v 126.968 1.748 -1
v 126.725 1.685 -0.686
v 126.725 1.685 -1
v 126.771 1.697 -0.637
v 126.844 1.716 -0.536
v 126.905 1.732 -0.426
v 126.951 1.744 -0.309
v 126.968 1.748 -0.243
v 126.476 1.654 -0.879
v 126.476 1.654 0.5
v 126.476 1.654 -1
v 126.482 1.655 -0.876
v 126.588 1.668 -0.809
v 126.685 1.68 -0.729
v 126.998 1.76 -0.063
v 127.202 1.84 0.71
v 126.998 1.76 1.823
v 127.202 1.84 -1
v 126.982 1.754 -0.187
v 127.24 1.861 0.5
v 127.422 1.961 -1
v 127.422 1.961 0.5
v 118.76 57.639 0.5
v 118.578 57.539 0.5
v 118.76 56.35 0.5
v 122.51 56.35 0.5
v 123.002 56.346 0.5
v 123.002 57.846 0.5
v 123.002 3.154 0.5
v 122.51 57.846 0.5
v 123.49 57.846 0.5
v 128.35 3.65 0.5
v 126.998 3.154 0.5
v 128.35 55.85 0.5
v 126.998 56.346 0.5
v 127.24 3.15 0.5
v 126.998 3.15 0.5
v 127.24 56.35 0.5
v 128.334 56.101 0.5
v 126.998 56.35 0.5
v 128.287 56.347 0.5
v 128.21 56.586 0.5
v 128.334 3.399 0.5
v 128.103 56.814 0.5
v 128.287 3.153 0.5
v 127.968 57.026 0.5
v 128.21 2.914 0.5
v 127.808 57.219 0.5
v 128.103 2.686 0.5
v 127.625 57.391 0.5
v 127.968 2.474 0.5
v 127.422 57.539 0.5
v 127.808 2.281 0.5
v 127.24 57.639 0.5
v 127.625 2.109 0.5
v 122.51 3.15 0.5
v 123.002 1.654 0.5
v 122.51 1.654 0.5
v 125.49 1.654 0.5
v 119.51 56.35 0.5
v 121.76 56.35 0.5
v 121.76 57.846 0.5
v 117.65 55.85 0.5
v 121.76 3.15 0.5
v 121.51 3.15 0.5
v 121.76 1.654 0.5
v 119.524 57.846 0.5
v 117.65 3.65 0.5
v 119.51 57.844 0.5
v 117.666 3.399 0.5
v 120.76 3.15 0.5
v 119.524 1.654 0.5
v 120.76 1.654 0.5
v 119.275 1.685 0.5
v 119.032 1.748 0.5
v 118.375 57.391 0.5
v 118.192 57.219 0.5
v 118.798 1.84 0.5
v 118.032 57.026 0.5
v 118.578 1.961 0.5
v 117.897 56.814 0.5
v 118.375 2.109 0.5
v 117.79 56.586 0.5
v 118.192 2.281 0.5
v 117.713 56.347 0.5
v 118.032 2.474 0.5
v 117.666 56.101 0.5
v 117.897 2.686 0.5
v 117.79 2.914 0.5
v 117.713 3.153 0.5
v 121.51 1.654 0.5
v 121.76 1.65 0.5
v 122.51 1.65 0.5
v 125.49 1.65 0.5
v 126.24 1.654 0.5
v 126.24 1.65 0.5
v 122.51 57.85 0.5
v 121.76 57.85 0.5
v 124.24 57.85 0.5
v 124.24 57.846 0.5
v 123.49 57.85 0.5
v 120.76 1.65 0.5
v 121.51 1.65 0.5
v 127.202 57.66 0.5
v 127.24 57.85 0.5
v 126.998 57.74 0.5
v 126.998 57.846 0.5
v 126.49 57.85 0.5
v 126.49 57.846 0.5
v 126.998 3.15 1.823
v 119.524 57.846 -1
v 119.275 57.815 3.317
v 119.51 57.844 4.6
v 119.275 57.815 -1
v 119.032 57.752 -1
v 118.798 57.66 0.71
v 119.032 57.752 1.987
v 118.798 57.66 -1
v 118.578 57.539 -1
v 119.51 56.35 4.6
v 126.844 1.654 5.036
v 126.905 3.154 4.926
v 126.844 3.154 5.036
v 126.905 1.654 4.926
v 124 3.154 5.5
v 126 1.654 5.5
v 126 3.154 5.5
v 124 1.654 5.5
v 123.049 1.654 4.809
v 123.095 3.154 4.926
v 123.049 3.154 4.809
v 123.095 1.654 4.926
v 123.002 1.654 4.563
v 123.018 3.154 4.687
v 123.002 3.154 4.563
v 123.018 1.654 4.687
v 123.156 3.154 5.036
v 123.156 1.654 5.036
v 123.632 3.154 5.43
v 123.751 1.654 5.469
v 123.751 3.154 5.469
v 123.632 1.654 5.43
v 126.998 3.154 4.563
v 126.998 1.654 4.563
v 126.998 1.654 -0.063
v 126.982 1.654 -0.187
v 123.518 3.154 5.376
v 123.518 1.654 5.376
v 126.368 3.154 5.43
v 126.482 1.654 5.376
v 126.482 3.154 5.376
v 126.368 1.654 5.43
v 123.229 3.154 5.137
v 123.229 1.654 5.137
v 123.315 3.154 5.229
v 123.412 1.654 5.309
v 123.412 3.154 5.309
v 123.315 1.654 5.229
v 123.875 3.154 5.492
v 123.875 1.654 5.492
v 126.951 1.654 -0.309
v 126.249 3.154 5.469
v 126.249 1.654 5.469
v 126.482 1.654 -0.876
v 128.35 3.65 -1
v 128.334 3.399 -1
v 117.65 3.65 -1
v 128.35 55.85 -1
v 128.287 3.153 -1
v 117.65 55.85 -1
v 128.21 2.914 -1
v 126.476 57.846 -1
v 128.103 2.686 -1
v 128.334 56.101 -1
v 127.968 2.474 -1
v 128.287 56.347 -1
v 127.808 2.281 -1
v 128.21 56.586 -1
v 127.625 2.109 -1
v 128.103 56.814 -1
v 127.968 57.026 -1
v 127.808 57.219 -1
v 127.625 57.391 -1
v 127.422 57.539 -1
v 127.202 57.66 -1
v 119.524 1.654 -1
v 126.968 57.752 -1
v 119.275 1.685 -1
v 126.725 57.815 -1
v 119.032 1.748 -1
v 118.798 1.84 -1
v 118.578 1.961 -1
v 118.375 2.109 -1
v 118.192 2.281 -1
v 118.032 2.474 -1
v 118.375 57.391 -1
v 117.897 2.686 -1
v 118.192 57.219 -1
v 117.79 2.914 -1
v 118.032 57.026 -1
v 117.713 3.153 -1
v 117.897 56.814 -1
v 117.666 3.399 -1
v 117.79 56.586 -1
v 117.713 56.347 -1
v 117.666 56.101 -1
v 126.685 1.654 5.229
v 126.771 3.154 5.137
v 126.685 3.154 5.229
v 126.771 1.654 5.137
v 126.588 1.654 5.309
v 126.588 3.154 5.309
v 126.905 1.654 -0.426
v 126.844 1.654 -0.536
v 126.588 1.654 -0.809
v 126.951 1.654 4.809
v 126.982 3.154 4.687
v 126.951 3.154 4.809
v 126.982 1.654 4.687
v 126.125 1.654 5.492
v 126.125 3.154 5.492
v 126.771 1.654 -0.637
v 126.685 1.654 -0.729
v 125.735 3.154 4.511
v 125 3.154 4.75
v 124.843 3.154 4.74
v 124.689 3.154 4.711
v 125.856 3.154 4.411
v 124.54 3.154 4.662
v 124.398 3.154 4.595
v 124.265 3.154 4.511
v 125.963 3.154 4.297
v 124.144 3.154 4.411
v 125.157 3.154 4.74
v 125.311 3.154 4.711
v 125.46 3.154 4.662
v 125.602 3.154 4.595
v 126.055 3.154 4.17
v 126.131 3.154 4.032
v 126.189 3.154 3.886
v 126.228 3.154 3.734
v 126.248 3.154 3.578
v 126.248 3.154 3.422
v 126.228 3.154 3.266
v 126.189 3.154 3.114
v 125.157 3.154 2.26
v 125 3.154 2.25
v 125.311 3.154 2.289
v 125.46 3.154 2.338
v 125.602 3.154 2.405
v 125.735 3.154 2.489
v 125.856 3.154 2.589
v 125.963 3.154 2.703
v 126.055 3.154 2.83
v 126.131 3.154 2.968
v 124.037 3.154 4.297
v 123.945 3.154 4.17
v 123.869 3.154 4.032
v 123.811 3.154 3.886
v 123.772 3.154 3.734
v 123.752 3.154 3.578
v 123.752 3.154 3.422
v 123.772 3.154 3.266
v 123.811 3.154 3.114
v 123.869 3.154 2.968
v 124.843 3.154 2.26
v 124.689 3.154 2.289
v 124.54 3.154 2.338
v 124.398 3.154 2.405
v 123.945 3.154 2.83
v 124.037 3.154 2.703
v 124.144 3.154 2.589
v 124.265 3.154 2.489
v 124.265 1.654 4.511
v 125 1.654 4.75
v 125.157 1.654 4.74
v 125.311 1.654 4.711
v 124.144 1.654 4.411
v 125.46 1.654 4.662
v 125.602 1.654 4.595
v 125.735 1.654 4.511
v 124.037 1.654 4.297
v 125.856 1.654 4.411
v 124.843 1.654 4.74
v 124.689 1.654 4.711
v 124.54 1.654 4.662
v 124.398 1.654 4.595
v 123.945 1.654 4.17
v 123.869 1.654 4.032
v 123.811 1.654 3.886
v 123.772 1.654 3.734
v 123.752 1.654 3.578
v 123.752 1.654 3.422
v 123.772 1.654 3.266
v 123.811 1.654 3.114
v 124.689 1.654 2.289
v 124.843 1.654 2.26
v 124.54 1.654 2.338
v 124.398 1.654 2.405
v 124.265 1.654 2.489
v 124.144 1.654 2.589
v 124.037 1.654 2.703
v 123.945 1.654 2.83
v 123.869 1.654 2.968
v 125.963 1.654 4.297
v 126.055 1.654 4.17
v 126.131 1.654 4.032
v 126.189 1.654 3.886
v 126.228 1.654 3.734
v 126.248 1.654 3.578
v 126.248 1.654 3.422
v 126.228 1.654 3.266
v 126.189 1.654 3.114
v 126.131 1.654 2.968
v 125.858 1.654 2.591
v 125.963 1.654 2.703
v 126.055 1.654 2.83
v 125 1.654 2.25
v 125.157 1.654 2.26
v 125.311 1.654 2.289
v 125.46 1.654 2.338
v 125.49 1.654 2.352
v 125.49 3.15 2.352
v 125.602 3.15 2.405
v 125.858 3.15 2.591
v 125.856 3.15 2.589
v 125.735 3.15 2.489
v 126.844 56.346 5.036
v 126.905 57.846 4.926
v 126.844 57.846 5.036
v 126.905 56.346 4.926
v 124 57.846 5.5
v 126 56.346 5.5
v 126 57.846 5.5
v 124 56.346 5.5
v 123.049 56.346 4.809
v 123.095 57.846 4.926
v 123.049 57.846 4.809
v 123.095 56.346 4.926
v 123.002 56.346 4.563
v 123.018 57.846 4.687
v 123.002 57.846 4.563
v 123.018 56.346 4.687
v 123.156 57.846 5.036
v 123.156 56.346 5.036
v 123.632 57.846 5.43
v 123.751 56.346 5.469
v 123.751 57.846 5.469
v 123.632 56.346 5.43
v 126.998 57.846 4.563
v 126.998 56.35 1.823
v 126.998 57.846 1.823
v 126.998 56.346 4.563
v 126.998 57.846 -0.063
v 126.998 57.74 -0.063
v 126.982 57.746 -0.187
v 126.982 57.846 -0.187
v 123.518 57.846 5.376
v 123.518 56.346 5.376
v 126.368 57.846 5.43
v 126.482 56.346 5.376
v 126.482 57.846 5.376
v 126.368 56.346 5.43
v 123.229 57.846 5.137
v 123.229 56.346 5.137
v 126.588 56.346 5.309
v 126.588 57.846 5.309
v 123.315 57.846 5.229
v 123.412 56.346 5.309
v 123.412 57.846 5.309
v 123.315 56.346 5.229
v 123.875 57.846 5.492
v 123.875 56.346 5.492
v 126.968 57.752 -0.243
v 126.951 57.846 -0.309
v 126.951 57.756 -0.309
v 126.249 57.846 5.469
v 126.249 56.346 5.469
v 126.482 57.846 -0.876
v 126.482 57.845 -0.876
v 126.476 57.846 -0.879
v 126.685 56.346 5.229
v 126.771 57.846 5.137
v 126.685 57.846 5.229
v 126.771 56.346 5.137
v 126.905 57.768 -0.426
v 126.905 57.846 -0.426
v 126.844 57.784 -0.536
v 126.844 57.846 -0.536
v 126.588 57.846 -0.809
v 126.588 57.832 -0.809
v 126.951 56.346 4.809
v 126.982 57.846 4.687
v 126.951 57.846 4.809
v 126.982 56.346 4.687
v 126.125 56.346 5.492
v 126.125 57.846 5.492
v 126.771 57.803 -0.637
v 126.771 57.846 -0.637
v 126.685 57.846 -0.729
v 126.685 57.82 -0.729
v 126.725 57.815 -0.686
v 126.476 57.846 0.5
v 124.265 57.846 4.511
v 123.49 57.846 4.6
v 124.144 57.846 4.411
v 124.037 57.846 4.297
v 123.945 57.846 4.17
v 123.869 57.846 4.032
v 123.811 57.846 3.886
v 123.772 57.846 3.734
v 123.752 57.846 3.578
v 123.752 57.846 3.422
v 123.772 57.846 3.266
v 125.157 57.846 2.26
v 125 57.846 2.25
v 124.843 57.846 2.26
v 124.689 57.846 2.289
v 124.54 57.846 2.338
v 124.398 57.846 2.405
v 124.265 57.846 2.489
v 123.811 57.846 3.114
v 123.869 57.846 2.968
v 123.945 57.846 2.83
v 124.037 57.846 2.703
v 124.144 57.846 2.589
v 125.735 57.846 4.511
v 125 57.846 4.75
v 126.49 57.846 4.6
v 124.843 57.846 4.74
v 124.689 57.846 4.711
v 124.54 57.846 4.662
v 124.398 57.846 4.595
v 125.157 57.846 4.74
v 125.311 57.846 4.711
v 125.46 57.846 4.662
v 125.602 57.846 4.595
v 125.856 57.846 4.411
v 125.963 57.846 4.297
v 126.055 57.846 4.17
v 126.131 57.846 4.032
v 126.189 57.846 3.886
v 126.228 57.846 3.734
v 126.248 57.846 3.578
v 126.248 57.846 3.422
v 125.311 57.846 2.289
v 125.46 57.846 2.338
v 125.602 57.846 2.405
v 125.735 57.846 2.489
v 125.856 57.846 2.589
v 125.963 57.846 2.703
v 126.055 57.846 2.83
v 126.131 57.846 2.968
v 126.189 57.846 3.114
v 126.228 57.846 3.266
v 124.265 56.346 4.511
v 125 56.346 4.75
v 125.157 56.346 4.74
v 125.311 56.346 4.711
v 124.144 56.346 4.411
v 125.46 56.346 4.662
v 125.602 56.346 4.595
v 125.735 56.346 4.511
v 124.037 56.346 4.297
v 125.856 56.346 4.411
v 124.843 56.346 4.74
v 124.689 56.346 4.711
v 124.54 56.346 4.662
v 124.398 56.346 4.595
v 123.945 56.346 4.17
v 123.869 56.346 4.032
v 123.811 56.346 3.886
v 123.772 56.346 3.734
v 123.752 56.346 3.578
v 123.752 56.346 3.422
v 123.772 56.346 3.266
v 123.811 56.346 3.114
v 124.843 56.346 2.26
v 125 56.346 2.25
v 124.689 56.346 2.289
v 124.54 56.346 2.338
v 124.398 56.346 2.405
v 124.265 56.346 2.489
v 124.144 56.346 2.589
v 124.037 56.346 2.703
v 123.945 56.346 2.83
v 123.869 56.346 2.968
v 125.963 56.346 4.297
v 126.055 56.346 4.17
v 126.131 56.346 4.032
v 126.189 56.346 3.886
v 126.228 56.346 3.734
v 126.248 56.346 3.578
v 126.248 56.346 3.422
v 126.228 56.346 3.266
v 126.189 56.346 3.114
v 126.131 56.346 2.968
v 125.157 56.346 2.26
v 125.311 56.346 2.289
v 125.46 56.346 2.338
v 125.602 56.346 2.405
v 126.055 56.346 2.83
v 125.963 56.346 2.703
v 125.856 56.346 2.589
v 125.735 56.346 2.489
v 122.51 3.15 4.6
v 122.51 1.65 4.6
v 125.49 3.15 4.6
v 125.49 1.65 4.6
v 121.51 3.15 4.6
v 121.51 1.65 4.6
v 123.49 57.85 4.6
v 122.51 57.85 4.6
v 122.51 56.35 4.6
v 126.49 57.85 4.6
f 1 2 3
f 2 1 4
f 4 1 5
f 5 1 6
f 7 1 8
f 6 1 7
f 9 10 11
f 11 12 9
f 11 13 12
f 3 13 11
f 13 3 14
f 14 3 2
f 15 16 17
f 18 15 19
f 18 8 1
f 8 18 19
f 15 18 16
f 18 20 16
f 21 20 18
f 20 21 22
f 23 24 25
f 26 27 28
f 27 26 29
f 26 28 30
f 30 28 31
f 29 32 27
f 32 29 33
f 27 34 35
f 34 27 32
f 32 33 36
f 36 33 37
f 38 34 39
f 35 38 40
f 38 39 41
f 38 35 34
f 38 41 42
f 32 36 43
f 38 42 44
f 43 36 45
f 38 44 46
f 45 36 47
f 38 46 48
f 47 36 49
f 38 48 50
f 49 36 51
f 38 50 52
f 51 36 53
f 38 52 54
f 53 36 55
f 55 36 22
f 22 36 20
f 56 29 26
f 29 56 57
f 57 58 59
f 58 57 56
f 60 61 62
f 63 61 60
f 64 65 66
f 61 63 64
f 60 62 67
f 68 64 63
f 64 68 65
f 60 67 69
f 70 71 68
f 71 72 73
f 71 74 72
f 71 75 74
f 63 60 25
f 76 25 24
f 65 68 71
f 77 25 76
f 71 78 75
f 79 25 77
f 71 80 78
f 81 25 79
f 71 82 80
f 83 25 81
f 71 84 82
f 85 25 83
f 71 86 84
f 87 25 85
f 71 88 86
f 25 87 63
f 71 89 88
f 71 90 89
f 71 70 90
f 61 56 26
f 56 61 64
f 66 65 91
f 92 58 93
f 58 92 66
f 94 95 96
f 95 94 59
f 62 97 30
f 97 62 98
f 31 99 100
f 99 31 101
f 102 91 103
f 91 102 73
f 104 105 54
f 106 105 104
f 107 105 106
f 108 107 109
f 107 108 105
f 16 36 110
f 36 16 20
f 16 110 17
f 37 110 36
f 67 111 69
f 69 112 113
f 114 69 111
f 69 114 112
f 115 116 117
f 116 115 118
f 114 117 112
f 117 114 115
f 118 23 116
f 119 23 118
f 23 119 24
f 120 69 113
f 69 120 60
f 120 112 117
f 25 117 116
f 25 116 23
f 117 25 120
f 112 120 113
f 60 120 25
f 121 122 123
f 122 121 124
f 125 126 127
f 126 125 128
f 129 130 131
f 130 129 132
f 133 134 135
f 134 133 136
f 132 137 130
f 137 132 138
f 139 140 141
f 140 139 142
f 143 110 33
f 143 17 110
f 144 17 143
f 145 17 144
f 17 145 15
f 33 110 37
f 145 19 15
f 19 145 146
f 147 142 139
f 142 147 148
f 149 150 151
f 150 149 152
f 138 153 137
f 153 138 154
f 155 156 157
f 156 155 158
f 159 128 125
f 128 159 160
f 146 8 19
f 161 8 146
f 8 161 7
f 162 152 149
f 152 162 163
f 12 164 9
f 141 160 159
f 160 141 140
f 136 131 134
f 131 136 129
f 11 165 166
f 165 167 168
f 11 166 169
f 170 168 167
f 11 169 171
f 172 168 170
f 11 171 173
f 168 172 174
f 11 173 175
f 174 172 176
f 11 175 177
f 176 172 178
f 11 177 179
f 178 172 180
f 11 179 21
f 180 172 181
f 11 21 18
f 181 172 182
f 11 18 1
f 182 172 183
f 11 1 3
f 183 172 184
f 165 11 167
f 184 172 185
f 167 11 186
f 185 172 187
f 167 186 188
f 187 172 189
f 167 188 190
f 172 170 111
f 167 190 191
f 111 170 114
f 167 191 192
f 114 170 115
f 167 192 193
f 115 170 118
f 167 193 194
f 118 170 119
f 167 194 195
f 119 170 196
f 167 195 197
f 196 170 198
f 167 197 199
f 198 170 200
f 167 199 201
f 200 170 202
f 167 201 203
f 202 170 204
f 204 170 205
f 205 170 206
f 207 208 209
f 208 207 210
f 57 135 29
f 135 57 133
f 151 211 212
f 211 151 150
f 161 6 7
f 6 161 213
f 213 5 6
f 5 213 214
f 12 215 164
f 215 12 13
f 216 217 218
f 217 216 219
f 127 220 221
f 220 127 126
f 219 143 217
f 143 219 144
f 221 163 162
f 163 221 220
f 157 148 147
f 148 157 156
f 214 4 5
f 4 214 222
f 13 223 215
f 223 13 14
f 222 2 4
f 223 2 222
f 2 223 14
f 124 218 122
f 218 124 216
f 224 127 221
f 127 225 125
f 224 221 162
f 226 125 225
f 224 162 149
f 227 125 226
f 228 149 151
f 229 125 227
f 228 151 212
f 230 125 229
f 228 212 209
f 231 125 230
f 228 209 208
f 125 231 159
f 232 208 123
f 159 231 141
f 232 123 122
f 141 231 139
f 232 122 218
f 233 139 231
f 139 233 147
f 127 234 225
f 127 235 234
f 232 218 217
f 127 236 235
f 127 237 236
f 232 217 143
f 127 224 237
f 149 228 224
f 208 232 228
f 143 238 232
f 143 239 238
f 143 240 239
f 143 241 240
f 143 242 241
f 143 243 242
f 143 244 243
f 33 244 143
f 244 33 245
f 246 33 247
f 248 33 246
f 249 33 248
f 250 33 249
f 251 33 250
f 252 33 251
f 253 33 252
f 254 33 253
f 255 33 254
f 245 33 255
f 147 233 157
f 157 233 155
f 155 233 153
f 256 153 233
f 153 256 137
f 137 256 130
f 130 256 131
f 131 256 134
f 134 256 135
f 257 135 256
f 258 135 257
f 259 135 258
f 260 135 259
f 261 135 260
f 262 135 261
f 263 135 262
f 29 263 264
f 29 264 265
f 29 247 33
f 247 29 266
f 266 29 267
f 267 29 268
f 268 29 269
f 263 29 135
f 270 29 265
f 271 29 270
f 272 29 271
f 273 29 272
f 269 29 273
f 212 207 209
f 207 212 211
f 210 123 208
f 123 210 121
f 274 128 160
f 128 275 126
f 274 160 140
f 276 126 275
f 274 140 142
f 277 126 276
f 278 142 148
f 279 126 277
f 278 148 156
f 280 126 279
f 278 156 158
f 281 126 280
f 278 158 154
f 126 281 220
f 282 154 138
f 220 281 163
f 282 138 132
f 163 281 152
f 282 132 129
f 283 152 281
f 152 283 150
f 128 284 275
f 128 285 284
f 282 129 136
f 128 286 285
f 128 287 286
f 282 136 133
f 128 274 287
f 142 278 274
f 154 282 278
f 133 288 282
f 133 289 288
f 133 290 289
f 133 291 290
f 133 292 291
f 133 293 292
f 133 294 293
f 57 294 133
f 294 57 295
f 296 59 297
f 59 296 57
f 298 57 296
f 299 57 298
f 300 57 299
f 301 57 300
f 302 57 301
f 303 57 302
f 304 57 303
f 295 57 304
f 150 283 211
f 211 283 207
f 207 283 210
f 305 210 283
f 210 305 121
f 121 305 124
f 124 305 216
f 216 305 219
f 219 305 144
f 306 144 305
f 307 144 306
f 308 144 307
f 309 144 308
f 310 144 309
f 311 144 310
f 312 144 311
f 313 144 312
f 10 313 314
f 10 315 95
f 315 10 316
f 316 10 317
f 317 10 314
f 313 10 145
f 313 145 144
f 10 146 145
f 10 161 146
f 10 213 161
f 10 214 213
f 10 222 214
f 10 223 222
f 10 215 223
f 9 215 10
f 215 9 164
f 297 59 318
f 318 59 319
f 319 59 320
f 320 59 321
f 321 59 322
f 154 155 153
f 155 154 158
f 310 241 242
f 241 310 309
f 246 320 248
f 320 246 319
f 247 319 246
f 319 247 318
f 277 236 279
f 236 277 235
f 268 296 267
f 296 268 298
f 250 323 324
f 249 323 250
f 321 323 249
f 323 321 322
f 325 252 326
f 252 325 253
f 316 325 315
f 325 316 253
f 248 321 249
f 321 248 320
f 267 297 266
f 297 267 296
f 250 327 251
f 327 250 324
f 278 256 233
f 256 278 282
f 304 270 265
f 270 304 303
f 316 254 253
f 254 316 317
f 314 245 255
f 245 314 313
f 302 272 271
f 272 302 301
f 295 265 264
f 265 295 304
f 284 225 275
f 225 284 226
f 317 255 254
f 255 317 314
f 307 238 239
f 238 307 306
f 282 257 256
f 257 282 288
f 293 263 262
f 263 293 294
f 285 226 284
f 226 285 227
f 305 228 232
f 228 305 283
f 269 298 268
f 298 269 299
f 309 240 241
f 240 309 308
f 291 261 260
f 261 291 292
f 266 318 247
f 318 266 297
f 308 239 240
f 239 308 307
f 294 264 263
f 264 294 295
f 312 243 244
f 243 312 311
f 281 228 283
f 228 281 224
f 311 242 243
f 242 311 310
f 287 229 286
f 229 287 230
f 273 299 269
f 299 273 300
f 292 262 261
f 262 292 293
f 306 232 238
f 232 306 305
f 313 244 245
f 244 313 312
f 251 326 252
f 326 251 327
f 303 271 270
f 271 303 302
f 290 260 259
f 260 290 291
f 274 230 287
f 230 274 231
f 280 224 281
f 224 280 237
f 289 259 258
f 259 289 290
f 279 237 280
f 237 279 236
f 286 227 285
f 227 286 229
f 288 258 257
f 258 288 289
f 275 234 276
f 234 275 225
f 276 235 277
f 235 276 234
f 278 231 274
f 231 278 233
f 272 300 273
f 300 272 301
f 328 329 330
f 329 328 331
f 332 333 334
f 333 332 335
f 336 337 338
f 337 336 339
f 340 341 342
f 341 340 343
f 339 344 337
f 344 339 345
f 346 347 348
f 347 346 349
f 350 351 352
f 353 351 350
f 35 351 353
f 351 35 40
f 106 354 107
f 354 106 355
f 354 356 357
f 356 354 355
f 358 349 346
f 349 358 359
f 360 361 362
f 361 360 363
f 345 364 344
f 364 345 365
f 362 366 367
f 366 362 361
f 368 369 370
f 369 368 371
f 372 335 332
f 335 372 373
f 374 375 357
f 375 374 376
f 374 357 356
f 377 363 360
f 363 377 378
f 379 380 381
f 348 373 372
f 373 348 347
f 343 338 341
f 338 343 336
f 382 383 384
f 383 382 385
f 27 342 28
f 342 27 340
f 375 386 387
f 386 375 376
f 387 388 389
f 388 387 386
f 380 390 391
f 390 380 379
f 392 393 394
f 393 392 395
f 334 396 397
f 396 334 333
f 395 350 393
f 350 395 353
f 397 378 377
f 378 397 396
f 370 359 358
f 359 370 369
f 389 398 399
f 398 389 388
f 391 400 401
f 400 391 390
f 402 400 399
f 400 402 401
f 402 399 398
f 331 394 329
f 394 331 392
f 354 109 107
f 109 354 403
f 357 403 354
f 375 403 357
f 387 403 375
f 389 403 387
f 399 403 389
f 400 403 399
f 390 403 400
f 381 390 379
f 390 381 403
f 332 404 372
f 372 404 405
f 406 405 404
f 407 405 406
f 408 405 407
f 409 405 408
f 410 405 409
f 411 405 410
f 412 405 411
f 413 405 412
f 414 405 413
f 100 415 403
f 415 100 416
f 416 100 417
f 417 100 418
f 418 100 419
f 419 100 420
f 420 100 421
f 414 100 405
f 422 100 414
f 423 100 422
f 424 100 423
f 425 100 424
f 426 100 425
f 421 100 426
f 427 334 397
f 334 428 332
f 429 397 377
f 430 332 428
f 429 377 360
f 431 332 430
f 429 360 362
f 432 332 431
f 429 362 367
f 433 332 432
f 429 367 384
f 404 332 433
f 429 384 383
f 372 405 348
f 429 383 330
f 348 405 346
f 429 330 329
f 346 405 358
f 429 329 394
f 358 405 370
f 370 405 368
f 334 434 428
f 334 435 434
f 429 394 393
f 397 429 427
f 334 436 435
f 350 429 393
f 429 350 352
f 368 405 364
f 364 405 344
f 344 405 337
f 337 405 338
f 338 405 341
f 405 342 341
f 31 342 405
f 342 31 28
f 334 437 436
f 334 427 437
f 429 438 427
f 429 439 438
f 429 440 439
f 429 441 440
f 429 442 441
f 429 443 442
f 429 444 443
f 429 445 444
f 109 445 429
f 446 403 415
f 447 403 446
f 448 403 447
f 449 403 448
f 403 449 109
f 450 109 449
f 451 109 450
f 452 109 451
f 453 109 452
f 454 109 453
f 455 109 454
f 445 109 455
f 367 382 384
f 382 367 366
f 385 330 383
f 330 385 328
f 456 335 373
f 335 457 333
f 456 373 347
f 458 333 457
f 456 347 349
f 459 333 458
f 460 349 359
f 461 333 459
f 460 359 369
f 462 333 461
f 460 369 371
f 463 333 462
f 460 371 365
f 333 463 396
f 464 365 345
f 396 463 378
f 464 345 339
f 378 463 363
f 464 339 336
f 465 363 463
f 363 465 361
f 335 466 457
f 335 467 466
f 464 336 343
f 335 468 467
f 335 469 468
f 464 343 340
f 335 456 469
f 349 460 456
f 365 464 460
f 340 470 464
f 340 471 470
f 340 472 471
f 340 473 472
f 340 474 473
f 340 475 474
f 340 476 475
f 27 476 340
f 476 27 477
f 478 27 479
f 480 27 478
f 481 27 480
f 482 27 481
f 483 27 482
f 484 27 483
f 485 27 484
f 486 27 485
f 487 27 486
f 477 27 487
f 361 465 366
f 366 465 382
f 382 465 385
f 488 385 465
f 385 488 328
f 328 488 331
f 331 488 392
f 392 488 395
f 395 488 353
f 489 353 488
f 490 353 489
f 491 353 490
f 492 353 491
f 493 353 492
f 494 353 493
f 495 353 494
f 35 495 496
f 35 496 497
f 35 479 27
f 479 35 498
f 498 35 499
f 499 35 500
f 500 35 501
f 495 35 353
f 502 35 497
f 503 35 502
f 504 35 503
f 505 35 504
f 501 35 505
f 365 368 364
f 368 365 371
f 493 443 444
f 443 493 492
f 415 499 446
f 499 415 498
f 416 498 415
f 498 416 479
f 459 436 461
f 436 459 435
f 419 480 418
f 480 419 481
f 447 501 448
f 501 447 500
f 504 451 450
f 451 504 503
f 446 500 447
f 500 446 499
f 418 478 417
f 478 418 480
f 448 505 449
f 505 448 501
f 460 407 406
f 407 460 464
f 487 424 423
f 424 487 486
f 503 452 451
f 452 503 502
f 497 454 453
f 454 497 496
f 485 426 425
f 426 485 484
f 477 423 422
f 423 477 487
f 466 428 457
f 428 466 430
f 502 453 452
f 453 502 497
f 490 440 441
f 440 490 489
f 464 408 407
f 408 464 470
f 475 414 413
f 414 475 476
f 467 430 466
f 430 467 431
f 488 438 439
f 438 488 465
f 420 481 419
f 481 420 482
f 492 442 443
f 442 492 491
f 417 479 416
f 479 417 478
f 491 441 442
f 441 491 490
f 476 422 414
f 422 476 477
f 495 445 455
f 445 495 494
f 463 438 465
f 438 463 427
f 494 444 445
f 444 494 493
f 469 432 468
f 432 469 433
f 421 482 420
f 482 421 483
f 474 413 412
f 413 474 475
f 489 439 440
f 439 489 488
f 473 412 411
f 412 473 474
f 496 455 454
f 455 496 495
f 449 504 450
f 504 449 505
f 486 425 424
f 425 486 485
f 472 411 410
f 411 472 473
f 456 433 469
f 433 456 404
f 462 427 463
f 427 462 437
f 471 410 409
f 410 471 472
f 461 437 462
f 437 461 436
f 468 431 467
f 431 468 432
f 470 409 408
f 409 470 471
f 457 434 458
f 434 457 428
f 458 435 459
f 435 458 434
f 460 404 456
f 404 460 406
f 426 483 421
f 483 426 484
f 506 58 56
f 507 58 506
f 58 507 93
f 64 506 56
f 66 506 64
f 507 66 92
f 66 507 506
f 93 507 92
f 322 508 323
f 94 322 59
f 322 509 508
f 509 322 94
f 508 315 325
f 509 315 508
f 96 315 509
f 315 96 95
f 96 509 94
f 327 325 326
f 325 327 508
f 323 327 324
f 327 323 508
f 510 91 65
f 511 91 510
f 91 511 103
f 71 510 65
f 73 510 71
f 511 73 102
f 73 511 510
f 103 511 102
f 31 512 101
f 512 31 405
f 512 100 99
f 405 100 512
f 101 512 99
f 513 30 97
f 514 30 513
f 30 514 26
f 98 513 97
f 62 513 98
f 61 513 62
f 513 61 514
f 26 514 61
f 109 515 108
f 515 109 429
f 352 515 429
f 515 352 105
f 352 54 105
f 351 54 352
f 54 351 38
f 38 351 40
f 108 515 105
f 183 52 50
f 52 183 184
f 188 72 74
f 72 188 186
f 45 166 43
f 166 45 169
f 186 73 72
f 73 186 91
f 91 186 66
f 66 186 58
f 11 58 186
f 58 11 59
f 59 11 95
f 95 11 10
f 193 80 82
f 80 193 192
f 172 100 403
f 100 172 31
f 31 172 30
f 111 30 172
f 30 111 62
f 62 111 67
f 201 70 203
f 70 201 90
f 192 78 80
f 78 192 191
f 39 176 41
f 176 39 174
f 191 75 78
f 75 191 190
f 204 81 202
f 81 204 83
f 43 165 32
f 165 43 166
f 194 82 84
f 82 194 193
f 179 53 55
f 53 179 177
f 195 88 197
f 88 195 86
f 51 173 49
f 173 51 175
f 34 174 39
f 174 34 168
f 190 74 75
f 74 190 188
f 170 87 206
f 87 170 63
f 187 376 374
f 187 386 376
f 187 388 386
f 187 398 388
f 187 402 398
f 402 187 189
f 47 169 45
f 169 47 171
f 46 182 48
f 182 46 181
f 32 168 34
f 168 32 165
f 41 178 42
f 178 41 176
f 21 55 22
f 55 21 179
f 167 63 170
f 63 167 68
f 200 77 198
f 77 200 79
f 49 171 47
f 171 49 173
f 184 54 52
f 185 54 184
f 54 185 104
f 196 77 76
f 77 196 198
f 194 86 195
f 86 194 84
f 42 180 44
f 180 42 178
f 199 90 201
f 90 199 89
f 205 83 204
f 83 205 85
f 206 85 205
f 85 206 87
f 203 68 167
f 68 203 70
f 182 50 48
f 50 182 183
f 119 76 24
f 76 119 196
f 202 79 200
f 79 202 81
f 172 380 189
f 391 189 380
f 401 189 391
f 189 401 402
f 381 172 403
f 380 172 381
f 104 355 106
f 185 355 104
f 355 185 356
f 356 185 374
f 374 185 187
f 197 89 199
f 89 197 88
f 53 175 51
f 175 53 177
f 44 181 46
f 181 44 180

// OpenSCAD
/* [Credits] */
// www.brain-duino.com
// License CC-BY-SA 4.0
// Silver Kuusik - silver.kuusik@gmail.com

// Big thanks to:
// FB Aka Heartman/Hearty 2016
// http://www.thingiverse.com/thing:1264391

// Big thanks to:
// R. Miloh Alexander
// froggytoad@gmail.com

// Big thanks to:
// beau@nubcore.com
// 3D printing


/* [Version info] */
Version = "Neurobox v1.6.3.s";

/* [Box dimensions] */
// length, total, includes wall thickness
Length = 105;
// width, total, includes wall thickness
Width = 59.5;
// height, total includes wall thickness
Height = 14.0; // 23.5; -->> 15.5 -->> 14.0
// wall thickness
Thick = 1.5; // [2:5]

// diference 1.6 -->> 1.6.s
deltaH = 7.5; 

/* [Box options] */
// filet diameter
Filet = 2; // [0.1:12]
// filet smoothness
Resolution = 50; // [1:100]

module prism(l, w, h) {
    polyhedron(
       points=[[0,0,0], [l,0,0], [l,w,0], [0,w,0], [0,w,h], [l,w,h]],
       faces=[[0,1,2,3],[5,4,3,2],[0,4,5,1],[0,3,4],[5,2,1]]
    );
}

// round_box module
module round_box($l=Length, $w=Width, $h=Height) {
    $fn=Resolution;
    translate([0, Filet, Filet]) {
        minkowski() {
            cube([$l-(Filet/2), $w-(2*Filet), $h-(2*Filet)]);
            rotate([0, 90, 0]) {
                cylinder(r=Filet);
            }
            rotate([0, 0, 90]) {
                cylinder(r=Filet);
            }
            rotate([90, 0, 0]) {
                cylinder(r=Filet);
            }
        }
    }
} // end of round_box module

// box module
module box() {
    $fn=Resolution;
    // assemble box and it's holes
    difference() {
        // make a rounded box
        translate([Filet+2, Filet+1, Filet]) {
            round_box(Length-8, Width-5, Height-5);
        }
        // make the rounded box empty inside
        translate([Thick, Thick, Thick]) {
            translate([0, 0, 0]) {
                minkowski() {
                    cube([Length-3, Width-3, Height-3]);
                }
            }
            // make the rear opening corners round
             translate([Length-3.5, 2, 2]) {
                 minkowski() {
                    cube([1, Width-7, Height-7]);
                     rotate([0, 90, 0]) {
                        cylinder(r=Filet);
                    }
                  }
            }
        }
        // version on the rear opening
        translate([Length-3.5, Width/4, Thick-0.3]) {
            rotate([0, 0, 90]) {
                color("RoyalBlue")
                linear_extrude(0.4) {
                    text(text=Version, size=3);
                }
            }
        }
        // logo substracted from bottom part
        mirror([0, 1, 0]) {
            rotate([0, 0, -90]) {
                translate([Width/2+1, 12, 0]) {
                    logo2(0.3);
                }
            }
        }
        // logo substracted from top part
        rotate([180, 0, 0]) {
            translate([Length/2, -Width/2, -Height]) {
                rotate([0, 0, -90]) {
                    mirror([1, 0, 0]) {
                        logo(0.3);
                    }
                }
            }
        }
        // lower left lid fixation screw head hole
        translate([Length-4.5, 0.5, 8.5]) {
            rotate([90, 0, 0]) {
                cylinder(d=5);
            }
        }
        // lower left lid fixation screw hole
        translate([Length-4.5, 2, 8.5]) {
            rotate([90, 0, 0]) {
                cylinder(d=2.5, 3);
            }
        }
        /*
        // upper left lid fixation screw head hole
         translate([Length-4.5, 0.5, Height-5.5]) {
             rotate([90, 0, 0]) {
                 cylinder(d=5);
            }
         }
        // upper left lid fixation screw hole
        translate([Length-4.5, 2, Height-5.5]) {
            rotate([90, 0, 0]) {
                cylinder(d=2.5, 3);
            }
        }
        */
        /*
        // lower right lid fixation screw head hole
        translate([Length-4.5, Width+0.5, 5.5]) {
            rotate([90, 0, 0]) {
                cylinder(d=5);
            }
        }
        // lower right lid fixation screw hole
        translate([Length-4.5, Width+1, 5.5]) {
            rotate([90, 0, 0]) {
                cylinder(d=2.5, 3);
            }
        }
        */
        // upper right lid fixation screw head hole   // Height-5.5 -->> 8.5
        translate([Length-4.5, Width+0.5, 8.5]) {
            rotate([90, 0, 0]) {
                cylinder(d=5);
            }
        }
        // upper right lid fixation screw hole   // Height-5.5 -->> 8.5
        translate([Length-4.5, Width+1, 8.5]) {
            rotate([90, 0, 0]) {
                cylinder(d=2.5, 3);
            }
        }
        // DC/DC usb charging hole // Length-19.25 -->> Length-14.25 -->> 15.0
        translate([Length-15.0, 2, 5.5]) {
            rotate([90, 0, 0]) {
                minkowski() {
                    cylinder(d=Filet);
                    cube([5.5, 1, 1]);
                }
            }
        }
        // headpad hole // Width-14.3 -->> 15.0,  12.75 -->> 4.5
        translate([-0.1, Width-15.0, 4.5]) {
            minkowski() {
                cube([1, 7.5, 5]);
                rotate([0, 90, 0]) {
                    cylinder(d=Filet, 3);
                }
            }
        }
        // 200Hz LED hole  12.5 -->> 4.0 -->> 3.5
        translate([-0.1, 6, 3.5]) {
            minkowski() {
                cube([1, 2, 0.25]);
                rotate([0, 90, 0]) {
                    cylinder(d=Filet/2, 3);
                }
            }
        }
        // button hole  -->> no need for s
        /*
         translate([0.5, 3, 3.25]) {
             sphere(r=7);
         }
        // canal for button
         translate([4.25, 1, 3.5]) {
             minkowski() {
                 cube([8.5, 1, 3]);
                 rotate([90, 0, 0]) {
                    cylinder(d=Filet*2);
                }
            }
        }
        */
    } // end of difference holes
    /*difference() {
        // button support cube
        translate([1.5, 1.5, 1.5]) {
            cube([6, 9, 8.75]);
        }
        // button hole
        translate([1.49, 5, 6]) {
            //sphere(r=10);
            rotate([0, 90, 0]) {
                cylinder(d=7, 7);
            }
        }
        // button sphere
        translate([0.5, 3, 3.25]) {
            sphere(r=7);
        }
    }*/
    // left upper PCB holding rail
    translate([1.5, 1.5, 12-deltaH]) {
        cube([Length-3-20, 2.25, 1]);
        translate([0, 0, 2.5]) {
            rotate([-90, 0, 0]) {
                prism(Length-3-20, 1.5, 2.25);
            }
        }
    }
    // left middle PCB psuher
    translate([1.5, 1.5, 10.5-deltaH]) {
        cube([Length-3-20, 0.6, 1.5]);
    }
    // right upper pcb holding rail
    translate([1.5, Width-4, 12-deltaH]) {
        cube([Length-3, 3, 1]);
        translate([0, 0, 1]) {
            prism(Length-3, 2.5, 1);
        }
    }
    // right middle pcb holding rail
    translate([1.5, Width-3.5, 10-deltaH]) {
        cube([Length-3, 2, 2]);
    }
    // right lower PCB holding rail
    /*translate([1.5, Width-4, 9.25]) {
        cube([Length-3, 3, 1]);
        translate([0, 2.5, -1]) {
            rotate([90, 0, 0]) {
                prism(Length-3, 1, 2.5);
            }
        }
    }*/
    // upper middle lid support
    translate([Length-2.8, Width/2-2, Height-2]) {
        minkowski() {
            cube([0.25, 4, 1]);
            rotate([0, 90, 0]) {
                cylinder(d=1, 1);
            }
        }
        translate([0, 4, 0]) {
            rotate([90, 0, -90]) {
                minkowski() {
                    prism(4, 1, 1);
                    rotate([0, 180, 0]) {
                        cylinder(d=1, 0.01);
                    }
                }
            }
        }
    }
    // upper left lid support
    translate([Length-2.8, 2, Height-2]) {
        minkowski() {
            cube([0.25, 1, 1]);
            rotate([0, 90, 0]) {
                cylinder(d=1, 1);
            }
        }
        translate([0, 1, 0]) {
            rotate([90, 0, -90]) {
                minkowski() {
                    prism(1, 1, 1);
                    rotate([0, 180, 0]) {
                        cylinder(d=1, 0.01);
                    }
                }
            }
        }
    }
    // upper right lid support
    translate([Length-2.8, Width-3, Height-2]) {
        minkowski() {
            cube([0.25, 1, 1]);
            rotate([0, 90, 0]) {
                cylinder(d=1, 1);
            }
        }
        translate([0, 1, 0]) {
            rotate([90, 0, -90]) {
                minkowski() {
                    prism(1, 1, 1);
                    rotate([0, 180, 0]) {
                        cylinder(d=1, 0.01);
                    }
                }
            }
        }
    }
    // lower right lid support
    /*
    translate([Length-2.8, Width-3, 1]) {
        minkowski() {
            cube([0.25, 1, 1]);
            rotate([0, 90, 0]) {
                cylinder(d=1, 1);
            }
        }
        translate([0, 0, 1]) {
            rotate([-90, 0, 90]) {
                minkowski() {
                    prism(1, 1, 1);
                    rotate([0, 180, 0]) {
                        cylinder(d=1, 0.01);
                    }
                }
            }
        }
    }
    */
    // lower left lid support
    /*translate([Length-2.8, Width/2-2, 1]) {
        minkowski() {
            cube([0.25, 4, 1]);
            rotate([0, 90, 0]) {
                cylinder(d=1, 1);
            }
        }
    }*/
} // end of module shell

// logo module
module logo(h) {
    scale([25.4/90, -25.4/90, 1]) {
        union() {
            linear_extrude(height=h) {
                polygon([[1.972725,30.118110],[-1.513255,30.118110],[-1.989391,30.021940],[-2.378289,29.759701],[-2.640532,29.370805],[-2.736705,28.894660],[-2.640532,28.418512],[-2.378289,28.029609],[-1.989391,27.767364],[-1.513255,27.671190],[1.972725,27.671190],[2.448859,27.767364],[2.837760,28.029609],[3.100009,28.418512],[3.196185,28.894660],[3.100009,29.370805],[2.837760,29.759701],[2.448859,30.021940]]);
                polygon([[11.882805,22.350380],[-12.156045,22.350380],[-12.631912,22.254205],[-13.020850,21.991956],[-13.283256,21.603050],[-13.379525,21.126900],[-13.283256,20.650742],[-13.020850,20.261836],[-12.631912,19.999592],[-12.156045,19.903420],[11.882805,19.903420],[12.358959,19.999592],[12.747865,20.261836],[13.010111,20.650742],[13.106285,21.126900],[13.010111,21.603050],[12.747865,21.991956],[12.358959,22.254205]]);
                polygon([[5.949825,26.118670],[-6.100455,26.118670],[-6.576593,26.022495],[-6.965494,25.760246],[-7.227740,25.371340],[-7.323915,24.895190],[-7.227740,24.419032],[-6.965494,24.030126],[-6.576593,23.767882],[-6.100455,23.671710],[5.949825,23.671710],[6.425979,23.767882],[6.814885,24.030126],[7.077131,24.419032],[7.173305,24.895190],[7.077131,25.371340],[6.814885,25.760246],[6.425979,26.022495]]);
                polygon([[16.469885,18.312950],[-16.437805,18.312950],[-16.913953,18.216777],[-17.302856,17.954533],[-17.565101,17.565632],[-17.661275,17.089490],[-17.565101,16.613335],[-17.302856,16.224425],[-16.913953,15.962175],[-16.437805,15.866000],[16.469885,15.866000],[16.946031,15.962175],[17.334931,16.224425],[17.597173,16.613335],[17.693345,17.089490],[17.597173,17.565632],[17.334931,17.954533],[16.946031,18.216777]]);
                polygon([[-1.263475,9.250060],[-0.832795,9.198660],[-0.220880,8.928285],[0.265531,8.465103],[0.596094,7.849546],[0.740465,7.122050],[3.179165,-19.066108],[8.983145,-4.889150],[9.415530,-4.186742],[9.981590,-3.655806],[10.647827,-3.319940],[11.380745,-3.202740],[18.674945,-3.202740],[19.150815,-3.298915],[19.539749,-3.561164],[19.802149,-3.950070],[19.898415,-4.426220],[19.802149,-4.902380],[19.539749,-5.291289],[19.150815,-5.553536],[18.674945,-5.649710],[11.380745,-5.649710],[11.211365,-5.900710],[4.622835,-21.809349],[4.244882,-22.390774],[3.737968,-22.799057],[3.142850,-23.011499],[2.500285,-23.005401],[1.848395,-22.752579],[1.330627,-22.288737],[0.979004,-21.654641],[0.825545,-20.891058],[-1.630345,5.605720],[-6.484475,-3.346800],[-7.046390,-4.093512],[-7.730146,-4.651719],[-8.503275,-5.001356],[-9.333305,-5.122360],[-17.633595,-5.122360],[-18.109760,-5.026183],[-18.498673,-4.763930],[-18.760921,-4.375017],[-18.857095,-3.898860],[-18.760921,-3.422711],[-18.498673,-3.033815],[-18.109760,-2.771579],[-17.633595,-2.675410],[-9.333305,-2.675410],[-8.947194,-2.522642],[-8.594015,-2.107540],[-2.916225,8.248810],[-2.197590,8.987843],[-1.263435,9.250070]]);
            }
            difference() {
                linear_extrude(height=h) {
                    polygon([[19.184025,14.399540],[-19.181965,14.399540],[-19.546155,13.998370],[-21.107020,12.109857],[-22.476769,10.100642],[-23.650163,7.984265],[-24.621961,5.774269],[-25.386925,3.484195],[-25.939815,1.127584],[-26.275392,-1.282021],[-26.388415,-3.731080],[-26.251912,-6.425079],[-25.851314,-9.042154],[-25.199988,-11.568939],[-24.311302,-13.992063],[-23.198623,-16.298160],[-21.875318,-18.473862],[-20.354754,-20.505799],[-18.650299,-22.380604],[-16.775319,-24.084909],[-14.743182,-25.605345],[-12.567255,-26.928545],[-10.260906,-28.041140],[-7.837501,-28.929762],[-5.310408,-29.581043],[-2.692993,-29.981615],[0.001375,-30.118110],[2.695597,-29.981615],[5.312838,-29.581043],[7.839737,-28.929762],[10.262931,-28.041140],[12.569057,-26.928545],[14.744754,-25.605345],[16.776660,-24.084909],[18.651411,-22.380604],[20.355647,-20.505799],[21.876004,-18.473862],[23.199120,-16.298160],[24.311634,-13.992063],[25.200182,-11.568939],[25.851403,-9.042154],[26.251935,-6.425079],[26.388415,-3.731080],[26.275421,-1.282421],[25.939928,1.126997],[25.387167,3.483584],[24.622372,5.773747],[23.650775,7.983899],[22.477608,10.100446],[21.108104,12.109800],[19.547495,13.998370],[19.184025,14.399540]]);
                }
                translate([0, 0, -0.1]) {
                    linear_extrude(height=h+2*0.1) {
                        polygon([[-18.090175,11.952590],[18.091535,11.952590],[19.426836,10.265659],[20.598308,8.478008],[21.601569,6.600922],[22.432241,4.645685],[23.085944,2.623582],[23.558297,0.545897],[23.844920,-1.576085],[23.941435,-3.731080],[23.817616,-6.175294],[23.454239,-8.549708],[22.863425,-10.842196],[22.057297,-13.040629],[21.047975,-15.132879],[19.847581,-17.106821],[18.468236,-18.950325],[16.922061,-20.651265],[15.221179,-22.197513],[13.377710,-23.576941],[11.403776,-24.777423],[9.311498,-25.786830],[7.112997,-26.593035],[4.820396,-27.183911],[2.445814,-27.547330],[0.001375,-27.671165],[-2.443211,-27.547330],[-4.817967,-27.183911],[-7.110766,-26.593035],[-9.309480,-25.786830],[-11.401985,-24.777423],[-13.376153,-23.576941],[-15.219858,-22.197513],[-16.920974,-20.651265],[-18.467373,-18.950325],[-19.846929,-17.106821],[-21.047516,-15.132879],[-22.057008,-13.040629],[-22.863277,-10.842196],[-23.454197,-8.549708],[-23.817642,-6.175294],[-23.941485,-3.731080],[-23.844967,-1.575686],[-23.558322,0.546484],[-23.085914,2.624193],[-22.432107,4.646206],[-21.601266,6.601288],[-20.597754,8.478203],[-19.425936,10.265716]]);
                    }
                }
            }
        }
    }
}

// logo2 module
module logo2(h) {
  fudge = 0.1;
  scale([25.4/90, -25.4/90, 1]) union() {
    difference() {
       linear_extrude(height=h)
         polygon([[48.899675,-4.846930],[49.624399,-6.564051],[50.639485,-8.071270],[51.941675,-9.332420],[53.526675,-10.310760],[55.395086,-10.937781],[57.546315,-11.146790],[59.697731,-10.937781],[61.566345,-10.310760],[63.151344,-9.332420],[64.453525,-8.071270],[65.468170,-6.564051],[66.193345,-4.846930],[66.774095,-1.057180],[66.193345,2.734200],[65.468170,4.450922],[64.453525,5.957720],[63.151344,7.216468],[61.566345,8.183930],[59.697731,8.801165],[57.546315,9.007040],[55.395086,8.801165],[53.526675,8.183930],[51.941675,7.216468],[50.639485,5.957720],[49.624399,4.450923],[48.899675,2.734200],[48.318925,-1.057180]]);
       translate([0, 0, -fudge])
         linear_extrude(height=h+2*fudge)
           polygon([[51.259765,1.817110],[52.447445,4.366740],[53.371348,5.388175],[54.524825,6.187610],[55.913973,6.703623],[57.546315,6.876030],[59.178999,6.703623],[60.568195,6.187610],[61.721662,5.388175],[62.645555,4.366740],[63.833265,1.817110],[64.210335,-1.057180],[63.833265,-3.929830],[62.645555,-6.479460],[61.721662,-7.501514],[60.568195,-8.300330],[59.178999,-8.816446],[57.546315,-8.988350],[55.913972,-8.816446],[54.524825,-8.300330],[53.371348,-7.501514],[52.447445,-6.479460],[51.259765,-3.929830],[50.882675,-1.057180]]);
    }
    difference() {
       linear_extrude(height=h)
         polygon([[22.060435,8.467790],[-0.501065,8.467790],[-0.715225,8.231880],[-2.438603,5.939782],[-3.700105,3.395615],[-4.475082,0.663085],[-4.738885,-2.194100],[-4.423038,-5.317329],[-3.517419,-8.228171],[-2.084916,-10.863736],[-0.188412,-13.161134],[2.109205,-15.057474],[4.745051,-16.489867],[7.656239,-17.395423],[10.779885,-17.711250],[13.903344,-17.395423],[16.814295,-16.489867],[19.449876,-15.057474],[21.747224,-13.161134],[23.643477,-10.863736],[25.075773,-8.228171],[25.981250,-5.317329],[26.297045,-2.194100],[26.033308,0.662744],[25.258506,3.395311],[23.997257,5.939668],[22.274175,8.231880],[22.060435,8.467790]]);
       translate([0, 0, -fudge])
         linear_extrude(height=h+2*fudge)
           polygon([[0.140975,7.028840],[21.417985,7.028840],[22.892116,4.985575],[23.970579,2.731939],[24.632767,0.321018],[24.858075,-2.194100],[24.571574,-5.027741],[23.750089,-7.668670],[22.450643,-10.059834],[20.730263,-12.144179],[18.645971,-13.864651],[16.254795,-15.164198],[13.613758,-15.985766],[10.779885,-16.272300],[7.945824,-15.985766],[5.304546,-15.164198],[2.913099,-13.864651],[0.828534,-12.144179],[-0.892102,-10.059834],[-2.191760,-7.668670],[-3.013391,-5.027741],[-3.299945,-2.194100],[-3.074622,0.321364],[-2.412341,2.732246],[-1.333632,4.985691],[0.140975,7.028840]]);
    }
    difference() {
       linear_extrude(height=h)
         polygon([[-16.539175,-10.688860],[-14.087689,-10.351346],[-12.236015,-9.339020],[-11.072711,-7.740865],[-10.684945,-5.643630],[-10.884071,-3.997440],[-11.480645,-2.568120],[-12.516047,-1.454816],[-14.030265,-0.760140],[-14.030265,-0.706540],[-12.667945,-0.166530],[-11.831915,0.738050],[-11.372555,1.911640],[-11.143485,3.260260],[-11.062485,4.689930],[-10.927795,6.120030],[-10.617255,7.455330],[-10.010295,8.575280],[-12.870465,8.575280],[-13.234225,7.765460],[-13.356025,6.619300],[-13.410125,5.256580],[-13.571865,3.826480],[-13.841665,2.491170],[-14.354245,1.385740],[-15.271745,0.629570],[-16.782475,0.346860],[-23.041205,0.346860],[-23.041205,8.575280],[-25.604545,8.575280],[-25.604545,-10.688900],[-16.539295,-10.688900]]);
       translate([0, 0, -fudge])
         linear_extrude(height=h+2*fudge)
           polygon([[-15.999545,-1.946630],[-14.583595,-2.473740],[-13.612045,-3.525540],[-13.247865,-5.237920],[-13.450425,-6.560430],[-14.057685,-7.612520],[-15.116290,-8.300890],[-16.674275,-8.530410],[-23.041085,-8.530410],[-23.041085,-1.811930],[-17.699435,-1.811930],[-15.999545,-1.946630]]);
    }
    linear_extrude(height=h) {
      polygon([[44.947675,-10.688860],[44.947675,-8.530410],[34.857655,-8.530410],[34.857655,-2.405990],[43.706335,-2.405990],[43.706335,-0.247550],[34.857655,-0.247550],[34.857655,8.575320],[32.294305,8.575320],[32.294305,-10.688860],[44.947675,-10.688860]]);
      polygon([[-51.476555,-10.688860],[-51.476555,-8.530410],[-62.214275,-8.530410],[-62.214275,-2.405990],[-52.205315,-2.405990],[-52.205315,-0.247550],[-62.214275,-0.247550],[-62.214275,6.416890],[-51.395905,6.416890],[-51.395905,8.575320],[-64.777615,8.575320],[-64.777615,-10.688860],[-51.476555,-10.688860]]);
      polygon([[10.036085,5.439590],[10.289345,5.409390],[10.935226,4.978021],[11.214515,4.188220],[12.648615,-11.211980],[16.061705,-2.875080],[16.648852,-2.149800],[17.471635,-1.883370],[21.761065,-1.883370],[22.269619,-2.094145],[22.480535,-2.602850],[22.269619,-3.111564],[21.761065,-3.322340],[17.471635,-3.322340],[17.372035,-3.469940],[13.497585,-12.825170],[12.977226,-13.407178],[12.249395,-13.528520],[11.561569,-13.107079],[11.264545,-12.285160],[9.820335,3.296530],[6.965825,-1.968090],[6.233289,-2.735458],[5.290535,-3.012220],[0.409475,-3.012220],[-0.099243,-2.801444],[-0.310015,-2.292730],[-0.099243,-1.784035],[0.409475,-1.573270],[5.290535,-1.573270],[5.725285,-1.239330],[9.064165,4.850820],[9.486767,5.285422],[10.036105,5.439630]]);
      polygon([[20.464355,10.769110],[1.112665,10.769110],[0.603965,10.558340],[0.393195,10.049640],[0.603965,9.540931],[1.112665,9.330160],[20.464355,9.330160],[20.973055,9.540931],[21.183825,10.049640],[20.973055,10.558340]]);
      polygon([[14.277935,15.359340],[7.191645,15.359340],[6.682949,15.148565],[6.472175,14.639860],[6.682949,14.131151],[7.191645,13.920380],[14.277935,13.920380],[14.786640,14.131151],[14.997415,14.639860],[14.786640,15.148565]]);
      polygon([[-83.176835,-10.688860],[-73.032765,4.933160],[-72.978665,4.933160],[-72.978665,-10.688860],[-70.550445,-10.688860],[-70.550445,8.575320],[-73.356555,8.575320],[-83.419565,-6.884980],[-83.473565,-6.884980],[-83.473565,8.575320],[-85.901815,8.575320],[-85.901815,-10.688860],[-83.176735,-10.688860]]);
      polygon([[-33.292745,7.158540],[-34.382153,7.967116],[-35.680645,8.544716],[-38.904585,9.006840],[-42.219714,8.565131],[-44.718475,7.239600],[-45.633376,6.225524],[-46.286832,4.949850],[-46.809555,1.614450],[-46.809555,-10.688860],[-44.246625,-10.688860],[-44.246625,1.614450],[-43.902612,3.890950],[-42.870175,5.540120],[-41.191063,6.541601],[-38.904585,6.875830],[-36.743074,6.541601],[-35.168055,5.540120],[-34.207057,3.890950],[-33.886395,1.614450],[-33.886395,-10.688860],[-31.323445,-10.688860],[-31.323445,1.614450],[-31.815975,4.848975],[-32.431407,6.119414],[-33.292745,7.158540]]);
      polygon([[17.766875,13.143360],[3.630595,13.143360],[3.122040,12.932585],[2.911115,12.423880],[3.122040,11.915171],[3.630595,11.704400],[17.766875,11.704400],[18.275584,11.915171],[18.486355,12.423880],[18.275584,12.932585],[17.766875,13.143360]]);
      polygon([[69.741005,-10.688860],[72.816535,-10.688860],[77.618555,-3.160960],[82.636735,-10.688860],[85.496505,-10.688860],[79.130505,-1.326780],[85.901815,8.575320],[82.772645,8.575320],[77.592335,0.616300],[72.249895,8.575320],[69.390535,8.575320],[76.081605,-1.326780],[69.741005,-10.688860]]);
      polygon([[11.939155,17.711250],[9.889195,17.711250],[9.380504,17.500485],[9.169735,16.991790],[9.380504,16.483085],[9.889195,16.272310],[11.939155,16.272310],[12.447851,16.483085],[12.658625,16.991790],[12.447851,17.500485]]);
    }
  }
}

module rear_panel() {
    $fn=Resolution;
    // upper left fixation leg support rounding
    intersection() {
        translate([-6, 3.5+0.15, Height-4.65]) {
            minkowski() {
                cube([5, 0.5, 0.5]);
                rotate([0, 90, 0]) {
                    cylinder(r=Filet);
                }
            }
        }
        translate([-4.1, 3.15, Height-4.01]) {
            rotate([0, 0, -90]) {
                prism(1.5, 4.1, 0.75);
            }
        }
    }
    // upper left lid fixation leg suppport
    translate([-4.1, 1.65, Height-7.99]) {
        rotate([0, 180, -90]) {
            prism(1.5, 4.1, 0.75);
        }
    }
 
    // lower left lid fixation leg suppport
    translate([-4.1, 3.15, 8.99]) {
        rotate([0, 0, -90]) {
            prism(1.5, 4.1, 0.75);
        }
    }
    translate([-4.1, 1.65, 5.01]) {
        rotate([0, 180, -90]) {
            prism(1.5, 4.1, 0.75);
        }
    }
 
    // lower right lid fixation leg support rounding
    intersection() {
        translate([-6, Width-4.15, 3.15]) {
            minkowski() {
                cube([5, 0.5, 0.5]);
                rotate([0, 90, 0]) {
                    cylinder(r=Filet);
                }
            }
        }
        translate([-4.1, Width-3.15, 3.01]) {
            rotate([0, 180, -90]) {
                prism(1.5, 4.1, 0.75);
            }
        }
    }
    // lower right lid fixation leg suppport rounding
    translate([-4.1, Width-1.65, 6.99]) {
        rotate([0, 0, -90]) {
            prism(1.5, 4.1, 0.75);
        }
    }
    
    
    // upper right lid fixation leg suppport
    translate([-4.1, Width-3.15, Height-7.99]) {
        rotate([0, 180, -90]) {
            prism(1.5, 4.1, 0.75);
        }
    }
    translate([-4.1, Width-1.65, Height-4.01]) {
        rotate([0, 0, -90]) {
            prism(1.5, 4.1, 0.75);
        }
    }
 
    // upper left lid fixation leg
    difference() {
        // left lid fixation screw leg  // 7-> 6.5
        translate([-4, 2.654, Height-6.5]) {
            minkowski() {
                cube([4.5, 0.5, 2]);
                rotate([90, 0, 0]) {
                    cylinder(d=Filet);
                }
            }
        }
        // left lid fixation hole //  Height-6 -->> 8.5
        translate([-3, 4, 8.5]) {
            rotate([90, 0, 0]) {
                cylinder(d=2.5, 3);
            }
        }
    }
    
    // lower left lid fixation leg
    difference() {
        /*
        // left lid fixation screw leg // 6-> 6.5
        translate([-4, 2.654, 6.5]) {
            minkowski() {
                cube([4.5, 0.5, 2]);
                rotate([90, 0, 0]) {
                    cylinder(d=Filet);
                }
            }
        }
        // left lid fixation hole // 7 ->> 8.0
        translate([-3, 4, 8.0]) {
            rotate([90, 0, 0]) {
                cylinder(d=2.5, 3);
            }
        }
        */
    }
    
    // upper right lid fixation leg
    difference() {
         
        // right lid fixation leg // 7 --> 6.5
        translate([-4, Width-2.154, Height-6.5]) {
            minkowski() {
                cube([4.5, 0.5, 2]);
                rotate([90, 0, 0]) {
                    cylinder(d=Filet);
                }
            }
        }
        // right lid fixation hole  // Height-6 -->> 8.5
        translate([-3, Width-1, 8.5]) {
            rotate([90, 0, 0]) {
                cylinder(d=2.5, 3);
            }
        }
         
    }
    
    // lower right lid fixation leg
    difference() {
        /*
        // right lid fixation leg
        translate([-4, Width-2.154, 4]) {
            minkowski() {
                cube([4.5, 0.5, 2]);
                rotate([90, 0, 0]) {
                    cylinder(d=Filet);
                }
            }
        }
        // right lid fixation hole  // 5 -->> 8.5
        translate([-3, Width-1, 8.5]) {
            rotate([90, 0, 0]) {
                cylinder(d=2.5, 3);
            }
        }
        */
    }
    
    // read panel and its holes
    difference() {
        // rear panel
        translate([0, 3.5+0.15, 3.15]) {
            minkowski() {
                cube([0.5, Width-7.3, Height-7.3]);
                rotate([0, 90, 0]) {
                    cylinder(r=Filet);
                }
            }
        }
        /*
        // charging indication hole
        translate([-0.1, 7.5, 4]) {
            minkowski() {
                cube([1, 5, 0.25]);
                rotate([0, 90, 0]) {
                    cylinder(d=Filet/2, 3);
                }
            }
        }
        // power indication hole
        translate([-0.1, 35, 4]) {
            minkowski() {
                cube([1, 2, 0.25]);
                rotate([0, 90, 0]) {
                    cylinder(d=Filet/2, 3);
                }
            }
        }
        */
    }
}

// box();
translate([Length + 11.5, 0, 0.5]) {
 rotate([0, 90, 0]) 
// translate([Length + 11.5, 0, 0.5]) {
     rear_panel();
}
